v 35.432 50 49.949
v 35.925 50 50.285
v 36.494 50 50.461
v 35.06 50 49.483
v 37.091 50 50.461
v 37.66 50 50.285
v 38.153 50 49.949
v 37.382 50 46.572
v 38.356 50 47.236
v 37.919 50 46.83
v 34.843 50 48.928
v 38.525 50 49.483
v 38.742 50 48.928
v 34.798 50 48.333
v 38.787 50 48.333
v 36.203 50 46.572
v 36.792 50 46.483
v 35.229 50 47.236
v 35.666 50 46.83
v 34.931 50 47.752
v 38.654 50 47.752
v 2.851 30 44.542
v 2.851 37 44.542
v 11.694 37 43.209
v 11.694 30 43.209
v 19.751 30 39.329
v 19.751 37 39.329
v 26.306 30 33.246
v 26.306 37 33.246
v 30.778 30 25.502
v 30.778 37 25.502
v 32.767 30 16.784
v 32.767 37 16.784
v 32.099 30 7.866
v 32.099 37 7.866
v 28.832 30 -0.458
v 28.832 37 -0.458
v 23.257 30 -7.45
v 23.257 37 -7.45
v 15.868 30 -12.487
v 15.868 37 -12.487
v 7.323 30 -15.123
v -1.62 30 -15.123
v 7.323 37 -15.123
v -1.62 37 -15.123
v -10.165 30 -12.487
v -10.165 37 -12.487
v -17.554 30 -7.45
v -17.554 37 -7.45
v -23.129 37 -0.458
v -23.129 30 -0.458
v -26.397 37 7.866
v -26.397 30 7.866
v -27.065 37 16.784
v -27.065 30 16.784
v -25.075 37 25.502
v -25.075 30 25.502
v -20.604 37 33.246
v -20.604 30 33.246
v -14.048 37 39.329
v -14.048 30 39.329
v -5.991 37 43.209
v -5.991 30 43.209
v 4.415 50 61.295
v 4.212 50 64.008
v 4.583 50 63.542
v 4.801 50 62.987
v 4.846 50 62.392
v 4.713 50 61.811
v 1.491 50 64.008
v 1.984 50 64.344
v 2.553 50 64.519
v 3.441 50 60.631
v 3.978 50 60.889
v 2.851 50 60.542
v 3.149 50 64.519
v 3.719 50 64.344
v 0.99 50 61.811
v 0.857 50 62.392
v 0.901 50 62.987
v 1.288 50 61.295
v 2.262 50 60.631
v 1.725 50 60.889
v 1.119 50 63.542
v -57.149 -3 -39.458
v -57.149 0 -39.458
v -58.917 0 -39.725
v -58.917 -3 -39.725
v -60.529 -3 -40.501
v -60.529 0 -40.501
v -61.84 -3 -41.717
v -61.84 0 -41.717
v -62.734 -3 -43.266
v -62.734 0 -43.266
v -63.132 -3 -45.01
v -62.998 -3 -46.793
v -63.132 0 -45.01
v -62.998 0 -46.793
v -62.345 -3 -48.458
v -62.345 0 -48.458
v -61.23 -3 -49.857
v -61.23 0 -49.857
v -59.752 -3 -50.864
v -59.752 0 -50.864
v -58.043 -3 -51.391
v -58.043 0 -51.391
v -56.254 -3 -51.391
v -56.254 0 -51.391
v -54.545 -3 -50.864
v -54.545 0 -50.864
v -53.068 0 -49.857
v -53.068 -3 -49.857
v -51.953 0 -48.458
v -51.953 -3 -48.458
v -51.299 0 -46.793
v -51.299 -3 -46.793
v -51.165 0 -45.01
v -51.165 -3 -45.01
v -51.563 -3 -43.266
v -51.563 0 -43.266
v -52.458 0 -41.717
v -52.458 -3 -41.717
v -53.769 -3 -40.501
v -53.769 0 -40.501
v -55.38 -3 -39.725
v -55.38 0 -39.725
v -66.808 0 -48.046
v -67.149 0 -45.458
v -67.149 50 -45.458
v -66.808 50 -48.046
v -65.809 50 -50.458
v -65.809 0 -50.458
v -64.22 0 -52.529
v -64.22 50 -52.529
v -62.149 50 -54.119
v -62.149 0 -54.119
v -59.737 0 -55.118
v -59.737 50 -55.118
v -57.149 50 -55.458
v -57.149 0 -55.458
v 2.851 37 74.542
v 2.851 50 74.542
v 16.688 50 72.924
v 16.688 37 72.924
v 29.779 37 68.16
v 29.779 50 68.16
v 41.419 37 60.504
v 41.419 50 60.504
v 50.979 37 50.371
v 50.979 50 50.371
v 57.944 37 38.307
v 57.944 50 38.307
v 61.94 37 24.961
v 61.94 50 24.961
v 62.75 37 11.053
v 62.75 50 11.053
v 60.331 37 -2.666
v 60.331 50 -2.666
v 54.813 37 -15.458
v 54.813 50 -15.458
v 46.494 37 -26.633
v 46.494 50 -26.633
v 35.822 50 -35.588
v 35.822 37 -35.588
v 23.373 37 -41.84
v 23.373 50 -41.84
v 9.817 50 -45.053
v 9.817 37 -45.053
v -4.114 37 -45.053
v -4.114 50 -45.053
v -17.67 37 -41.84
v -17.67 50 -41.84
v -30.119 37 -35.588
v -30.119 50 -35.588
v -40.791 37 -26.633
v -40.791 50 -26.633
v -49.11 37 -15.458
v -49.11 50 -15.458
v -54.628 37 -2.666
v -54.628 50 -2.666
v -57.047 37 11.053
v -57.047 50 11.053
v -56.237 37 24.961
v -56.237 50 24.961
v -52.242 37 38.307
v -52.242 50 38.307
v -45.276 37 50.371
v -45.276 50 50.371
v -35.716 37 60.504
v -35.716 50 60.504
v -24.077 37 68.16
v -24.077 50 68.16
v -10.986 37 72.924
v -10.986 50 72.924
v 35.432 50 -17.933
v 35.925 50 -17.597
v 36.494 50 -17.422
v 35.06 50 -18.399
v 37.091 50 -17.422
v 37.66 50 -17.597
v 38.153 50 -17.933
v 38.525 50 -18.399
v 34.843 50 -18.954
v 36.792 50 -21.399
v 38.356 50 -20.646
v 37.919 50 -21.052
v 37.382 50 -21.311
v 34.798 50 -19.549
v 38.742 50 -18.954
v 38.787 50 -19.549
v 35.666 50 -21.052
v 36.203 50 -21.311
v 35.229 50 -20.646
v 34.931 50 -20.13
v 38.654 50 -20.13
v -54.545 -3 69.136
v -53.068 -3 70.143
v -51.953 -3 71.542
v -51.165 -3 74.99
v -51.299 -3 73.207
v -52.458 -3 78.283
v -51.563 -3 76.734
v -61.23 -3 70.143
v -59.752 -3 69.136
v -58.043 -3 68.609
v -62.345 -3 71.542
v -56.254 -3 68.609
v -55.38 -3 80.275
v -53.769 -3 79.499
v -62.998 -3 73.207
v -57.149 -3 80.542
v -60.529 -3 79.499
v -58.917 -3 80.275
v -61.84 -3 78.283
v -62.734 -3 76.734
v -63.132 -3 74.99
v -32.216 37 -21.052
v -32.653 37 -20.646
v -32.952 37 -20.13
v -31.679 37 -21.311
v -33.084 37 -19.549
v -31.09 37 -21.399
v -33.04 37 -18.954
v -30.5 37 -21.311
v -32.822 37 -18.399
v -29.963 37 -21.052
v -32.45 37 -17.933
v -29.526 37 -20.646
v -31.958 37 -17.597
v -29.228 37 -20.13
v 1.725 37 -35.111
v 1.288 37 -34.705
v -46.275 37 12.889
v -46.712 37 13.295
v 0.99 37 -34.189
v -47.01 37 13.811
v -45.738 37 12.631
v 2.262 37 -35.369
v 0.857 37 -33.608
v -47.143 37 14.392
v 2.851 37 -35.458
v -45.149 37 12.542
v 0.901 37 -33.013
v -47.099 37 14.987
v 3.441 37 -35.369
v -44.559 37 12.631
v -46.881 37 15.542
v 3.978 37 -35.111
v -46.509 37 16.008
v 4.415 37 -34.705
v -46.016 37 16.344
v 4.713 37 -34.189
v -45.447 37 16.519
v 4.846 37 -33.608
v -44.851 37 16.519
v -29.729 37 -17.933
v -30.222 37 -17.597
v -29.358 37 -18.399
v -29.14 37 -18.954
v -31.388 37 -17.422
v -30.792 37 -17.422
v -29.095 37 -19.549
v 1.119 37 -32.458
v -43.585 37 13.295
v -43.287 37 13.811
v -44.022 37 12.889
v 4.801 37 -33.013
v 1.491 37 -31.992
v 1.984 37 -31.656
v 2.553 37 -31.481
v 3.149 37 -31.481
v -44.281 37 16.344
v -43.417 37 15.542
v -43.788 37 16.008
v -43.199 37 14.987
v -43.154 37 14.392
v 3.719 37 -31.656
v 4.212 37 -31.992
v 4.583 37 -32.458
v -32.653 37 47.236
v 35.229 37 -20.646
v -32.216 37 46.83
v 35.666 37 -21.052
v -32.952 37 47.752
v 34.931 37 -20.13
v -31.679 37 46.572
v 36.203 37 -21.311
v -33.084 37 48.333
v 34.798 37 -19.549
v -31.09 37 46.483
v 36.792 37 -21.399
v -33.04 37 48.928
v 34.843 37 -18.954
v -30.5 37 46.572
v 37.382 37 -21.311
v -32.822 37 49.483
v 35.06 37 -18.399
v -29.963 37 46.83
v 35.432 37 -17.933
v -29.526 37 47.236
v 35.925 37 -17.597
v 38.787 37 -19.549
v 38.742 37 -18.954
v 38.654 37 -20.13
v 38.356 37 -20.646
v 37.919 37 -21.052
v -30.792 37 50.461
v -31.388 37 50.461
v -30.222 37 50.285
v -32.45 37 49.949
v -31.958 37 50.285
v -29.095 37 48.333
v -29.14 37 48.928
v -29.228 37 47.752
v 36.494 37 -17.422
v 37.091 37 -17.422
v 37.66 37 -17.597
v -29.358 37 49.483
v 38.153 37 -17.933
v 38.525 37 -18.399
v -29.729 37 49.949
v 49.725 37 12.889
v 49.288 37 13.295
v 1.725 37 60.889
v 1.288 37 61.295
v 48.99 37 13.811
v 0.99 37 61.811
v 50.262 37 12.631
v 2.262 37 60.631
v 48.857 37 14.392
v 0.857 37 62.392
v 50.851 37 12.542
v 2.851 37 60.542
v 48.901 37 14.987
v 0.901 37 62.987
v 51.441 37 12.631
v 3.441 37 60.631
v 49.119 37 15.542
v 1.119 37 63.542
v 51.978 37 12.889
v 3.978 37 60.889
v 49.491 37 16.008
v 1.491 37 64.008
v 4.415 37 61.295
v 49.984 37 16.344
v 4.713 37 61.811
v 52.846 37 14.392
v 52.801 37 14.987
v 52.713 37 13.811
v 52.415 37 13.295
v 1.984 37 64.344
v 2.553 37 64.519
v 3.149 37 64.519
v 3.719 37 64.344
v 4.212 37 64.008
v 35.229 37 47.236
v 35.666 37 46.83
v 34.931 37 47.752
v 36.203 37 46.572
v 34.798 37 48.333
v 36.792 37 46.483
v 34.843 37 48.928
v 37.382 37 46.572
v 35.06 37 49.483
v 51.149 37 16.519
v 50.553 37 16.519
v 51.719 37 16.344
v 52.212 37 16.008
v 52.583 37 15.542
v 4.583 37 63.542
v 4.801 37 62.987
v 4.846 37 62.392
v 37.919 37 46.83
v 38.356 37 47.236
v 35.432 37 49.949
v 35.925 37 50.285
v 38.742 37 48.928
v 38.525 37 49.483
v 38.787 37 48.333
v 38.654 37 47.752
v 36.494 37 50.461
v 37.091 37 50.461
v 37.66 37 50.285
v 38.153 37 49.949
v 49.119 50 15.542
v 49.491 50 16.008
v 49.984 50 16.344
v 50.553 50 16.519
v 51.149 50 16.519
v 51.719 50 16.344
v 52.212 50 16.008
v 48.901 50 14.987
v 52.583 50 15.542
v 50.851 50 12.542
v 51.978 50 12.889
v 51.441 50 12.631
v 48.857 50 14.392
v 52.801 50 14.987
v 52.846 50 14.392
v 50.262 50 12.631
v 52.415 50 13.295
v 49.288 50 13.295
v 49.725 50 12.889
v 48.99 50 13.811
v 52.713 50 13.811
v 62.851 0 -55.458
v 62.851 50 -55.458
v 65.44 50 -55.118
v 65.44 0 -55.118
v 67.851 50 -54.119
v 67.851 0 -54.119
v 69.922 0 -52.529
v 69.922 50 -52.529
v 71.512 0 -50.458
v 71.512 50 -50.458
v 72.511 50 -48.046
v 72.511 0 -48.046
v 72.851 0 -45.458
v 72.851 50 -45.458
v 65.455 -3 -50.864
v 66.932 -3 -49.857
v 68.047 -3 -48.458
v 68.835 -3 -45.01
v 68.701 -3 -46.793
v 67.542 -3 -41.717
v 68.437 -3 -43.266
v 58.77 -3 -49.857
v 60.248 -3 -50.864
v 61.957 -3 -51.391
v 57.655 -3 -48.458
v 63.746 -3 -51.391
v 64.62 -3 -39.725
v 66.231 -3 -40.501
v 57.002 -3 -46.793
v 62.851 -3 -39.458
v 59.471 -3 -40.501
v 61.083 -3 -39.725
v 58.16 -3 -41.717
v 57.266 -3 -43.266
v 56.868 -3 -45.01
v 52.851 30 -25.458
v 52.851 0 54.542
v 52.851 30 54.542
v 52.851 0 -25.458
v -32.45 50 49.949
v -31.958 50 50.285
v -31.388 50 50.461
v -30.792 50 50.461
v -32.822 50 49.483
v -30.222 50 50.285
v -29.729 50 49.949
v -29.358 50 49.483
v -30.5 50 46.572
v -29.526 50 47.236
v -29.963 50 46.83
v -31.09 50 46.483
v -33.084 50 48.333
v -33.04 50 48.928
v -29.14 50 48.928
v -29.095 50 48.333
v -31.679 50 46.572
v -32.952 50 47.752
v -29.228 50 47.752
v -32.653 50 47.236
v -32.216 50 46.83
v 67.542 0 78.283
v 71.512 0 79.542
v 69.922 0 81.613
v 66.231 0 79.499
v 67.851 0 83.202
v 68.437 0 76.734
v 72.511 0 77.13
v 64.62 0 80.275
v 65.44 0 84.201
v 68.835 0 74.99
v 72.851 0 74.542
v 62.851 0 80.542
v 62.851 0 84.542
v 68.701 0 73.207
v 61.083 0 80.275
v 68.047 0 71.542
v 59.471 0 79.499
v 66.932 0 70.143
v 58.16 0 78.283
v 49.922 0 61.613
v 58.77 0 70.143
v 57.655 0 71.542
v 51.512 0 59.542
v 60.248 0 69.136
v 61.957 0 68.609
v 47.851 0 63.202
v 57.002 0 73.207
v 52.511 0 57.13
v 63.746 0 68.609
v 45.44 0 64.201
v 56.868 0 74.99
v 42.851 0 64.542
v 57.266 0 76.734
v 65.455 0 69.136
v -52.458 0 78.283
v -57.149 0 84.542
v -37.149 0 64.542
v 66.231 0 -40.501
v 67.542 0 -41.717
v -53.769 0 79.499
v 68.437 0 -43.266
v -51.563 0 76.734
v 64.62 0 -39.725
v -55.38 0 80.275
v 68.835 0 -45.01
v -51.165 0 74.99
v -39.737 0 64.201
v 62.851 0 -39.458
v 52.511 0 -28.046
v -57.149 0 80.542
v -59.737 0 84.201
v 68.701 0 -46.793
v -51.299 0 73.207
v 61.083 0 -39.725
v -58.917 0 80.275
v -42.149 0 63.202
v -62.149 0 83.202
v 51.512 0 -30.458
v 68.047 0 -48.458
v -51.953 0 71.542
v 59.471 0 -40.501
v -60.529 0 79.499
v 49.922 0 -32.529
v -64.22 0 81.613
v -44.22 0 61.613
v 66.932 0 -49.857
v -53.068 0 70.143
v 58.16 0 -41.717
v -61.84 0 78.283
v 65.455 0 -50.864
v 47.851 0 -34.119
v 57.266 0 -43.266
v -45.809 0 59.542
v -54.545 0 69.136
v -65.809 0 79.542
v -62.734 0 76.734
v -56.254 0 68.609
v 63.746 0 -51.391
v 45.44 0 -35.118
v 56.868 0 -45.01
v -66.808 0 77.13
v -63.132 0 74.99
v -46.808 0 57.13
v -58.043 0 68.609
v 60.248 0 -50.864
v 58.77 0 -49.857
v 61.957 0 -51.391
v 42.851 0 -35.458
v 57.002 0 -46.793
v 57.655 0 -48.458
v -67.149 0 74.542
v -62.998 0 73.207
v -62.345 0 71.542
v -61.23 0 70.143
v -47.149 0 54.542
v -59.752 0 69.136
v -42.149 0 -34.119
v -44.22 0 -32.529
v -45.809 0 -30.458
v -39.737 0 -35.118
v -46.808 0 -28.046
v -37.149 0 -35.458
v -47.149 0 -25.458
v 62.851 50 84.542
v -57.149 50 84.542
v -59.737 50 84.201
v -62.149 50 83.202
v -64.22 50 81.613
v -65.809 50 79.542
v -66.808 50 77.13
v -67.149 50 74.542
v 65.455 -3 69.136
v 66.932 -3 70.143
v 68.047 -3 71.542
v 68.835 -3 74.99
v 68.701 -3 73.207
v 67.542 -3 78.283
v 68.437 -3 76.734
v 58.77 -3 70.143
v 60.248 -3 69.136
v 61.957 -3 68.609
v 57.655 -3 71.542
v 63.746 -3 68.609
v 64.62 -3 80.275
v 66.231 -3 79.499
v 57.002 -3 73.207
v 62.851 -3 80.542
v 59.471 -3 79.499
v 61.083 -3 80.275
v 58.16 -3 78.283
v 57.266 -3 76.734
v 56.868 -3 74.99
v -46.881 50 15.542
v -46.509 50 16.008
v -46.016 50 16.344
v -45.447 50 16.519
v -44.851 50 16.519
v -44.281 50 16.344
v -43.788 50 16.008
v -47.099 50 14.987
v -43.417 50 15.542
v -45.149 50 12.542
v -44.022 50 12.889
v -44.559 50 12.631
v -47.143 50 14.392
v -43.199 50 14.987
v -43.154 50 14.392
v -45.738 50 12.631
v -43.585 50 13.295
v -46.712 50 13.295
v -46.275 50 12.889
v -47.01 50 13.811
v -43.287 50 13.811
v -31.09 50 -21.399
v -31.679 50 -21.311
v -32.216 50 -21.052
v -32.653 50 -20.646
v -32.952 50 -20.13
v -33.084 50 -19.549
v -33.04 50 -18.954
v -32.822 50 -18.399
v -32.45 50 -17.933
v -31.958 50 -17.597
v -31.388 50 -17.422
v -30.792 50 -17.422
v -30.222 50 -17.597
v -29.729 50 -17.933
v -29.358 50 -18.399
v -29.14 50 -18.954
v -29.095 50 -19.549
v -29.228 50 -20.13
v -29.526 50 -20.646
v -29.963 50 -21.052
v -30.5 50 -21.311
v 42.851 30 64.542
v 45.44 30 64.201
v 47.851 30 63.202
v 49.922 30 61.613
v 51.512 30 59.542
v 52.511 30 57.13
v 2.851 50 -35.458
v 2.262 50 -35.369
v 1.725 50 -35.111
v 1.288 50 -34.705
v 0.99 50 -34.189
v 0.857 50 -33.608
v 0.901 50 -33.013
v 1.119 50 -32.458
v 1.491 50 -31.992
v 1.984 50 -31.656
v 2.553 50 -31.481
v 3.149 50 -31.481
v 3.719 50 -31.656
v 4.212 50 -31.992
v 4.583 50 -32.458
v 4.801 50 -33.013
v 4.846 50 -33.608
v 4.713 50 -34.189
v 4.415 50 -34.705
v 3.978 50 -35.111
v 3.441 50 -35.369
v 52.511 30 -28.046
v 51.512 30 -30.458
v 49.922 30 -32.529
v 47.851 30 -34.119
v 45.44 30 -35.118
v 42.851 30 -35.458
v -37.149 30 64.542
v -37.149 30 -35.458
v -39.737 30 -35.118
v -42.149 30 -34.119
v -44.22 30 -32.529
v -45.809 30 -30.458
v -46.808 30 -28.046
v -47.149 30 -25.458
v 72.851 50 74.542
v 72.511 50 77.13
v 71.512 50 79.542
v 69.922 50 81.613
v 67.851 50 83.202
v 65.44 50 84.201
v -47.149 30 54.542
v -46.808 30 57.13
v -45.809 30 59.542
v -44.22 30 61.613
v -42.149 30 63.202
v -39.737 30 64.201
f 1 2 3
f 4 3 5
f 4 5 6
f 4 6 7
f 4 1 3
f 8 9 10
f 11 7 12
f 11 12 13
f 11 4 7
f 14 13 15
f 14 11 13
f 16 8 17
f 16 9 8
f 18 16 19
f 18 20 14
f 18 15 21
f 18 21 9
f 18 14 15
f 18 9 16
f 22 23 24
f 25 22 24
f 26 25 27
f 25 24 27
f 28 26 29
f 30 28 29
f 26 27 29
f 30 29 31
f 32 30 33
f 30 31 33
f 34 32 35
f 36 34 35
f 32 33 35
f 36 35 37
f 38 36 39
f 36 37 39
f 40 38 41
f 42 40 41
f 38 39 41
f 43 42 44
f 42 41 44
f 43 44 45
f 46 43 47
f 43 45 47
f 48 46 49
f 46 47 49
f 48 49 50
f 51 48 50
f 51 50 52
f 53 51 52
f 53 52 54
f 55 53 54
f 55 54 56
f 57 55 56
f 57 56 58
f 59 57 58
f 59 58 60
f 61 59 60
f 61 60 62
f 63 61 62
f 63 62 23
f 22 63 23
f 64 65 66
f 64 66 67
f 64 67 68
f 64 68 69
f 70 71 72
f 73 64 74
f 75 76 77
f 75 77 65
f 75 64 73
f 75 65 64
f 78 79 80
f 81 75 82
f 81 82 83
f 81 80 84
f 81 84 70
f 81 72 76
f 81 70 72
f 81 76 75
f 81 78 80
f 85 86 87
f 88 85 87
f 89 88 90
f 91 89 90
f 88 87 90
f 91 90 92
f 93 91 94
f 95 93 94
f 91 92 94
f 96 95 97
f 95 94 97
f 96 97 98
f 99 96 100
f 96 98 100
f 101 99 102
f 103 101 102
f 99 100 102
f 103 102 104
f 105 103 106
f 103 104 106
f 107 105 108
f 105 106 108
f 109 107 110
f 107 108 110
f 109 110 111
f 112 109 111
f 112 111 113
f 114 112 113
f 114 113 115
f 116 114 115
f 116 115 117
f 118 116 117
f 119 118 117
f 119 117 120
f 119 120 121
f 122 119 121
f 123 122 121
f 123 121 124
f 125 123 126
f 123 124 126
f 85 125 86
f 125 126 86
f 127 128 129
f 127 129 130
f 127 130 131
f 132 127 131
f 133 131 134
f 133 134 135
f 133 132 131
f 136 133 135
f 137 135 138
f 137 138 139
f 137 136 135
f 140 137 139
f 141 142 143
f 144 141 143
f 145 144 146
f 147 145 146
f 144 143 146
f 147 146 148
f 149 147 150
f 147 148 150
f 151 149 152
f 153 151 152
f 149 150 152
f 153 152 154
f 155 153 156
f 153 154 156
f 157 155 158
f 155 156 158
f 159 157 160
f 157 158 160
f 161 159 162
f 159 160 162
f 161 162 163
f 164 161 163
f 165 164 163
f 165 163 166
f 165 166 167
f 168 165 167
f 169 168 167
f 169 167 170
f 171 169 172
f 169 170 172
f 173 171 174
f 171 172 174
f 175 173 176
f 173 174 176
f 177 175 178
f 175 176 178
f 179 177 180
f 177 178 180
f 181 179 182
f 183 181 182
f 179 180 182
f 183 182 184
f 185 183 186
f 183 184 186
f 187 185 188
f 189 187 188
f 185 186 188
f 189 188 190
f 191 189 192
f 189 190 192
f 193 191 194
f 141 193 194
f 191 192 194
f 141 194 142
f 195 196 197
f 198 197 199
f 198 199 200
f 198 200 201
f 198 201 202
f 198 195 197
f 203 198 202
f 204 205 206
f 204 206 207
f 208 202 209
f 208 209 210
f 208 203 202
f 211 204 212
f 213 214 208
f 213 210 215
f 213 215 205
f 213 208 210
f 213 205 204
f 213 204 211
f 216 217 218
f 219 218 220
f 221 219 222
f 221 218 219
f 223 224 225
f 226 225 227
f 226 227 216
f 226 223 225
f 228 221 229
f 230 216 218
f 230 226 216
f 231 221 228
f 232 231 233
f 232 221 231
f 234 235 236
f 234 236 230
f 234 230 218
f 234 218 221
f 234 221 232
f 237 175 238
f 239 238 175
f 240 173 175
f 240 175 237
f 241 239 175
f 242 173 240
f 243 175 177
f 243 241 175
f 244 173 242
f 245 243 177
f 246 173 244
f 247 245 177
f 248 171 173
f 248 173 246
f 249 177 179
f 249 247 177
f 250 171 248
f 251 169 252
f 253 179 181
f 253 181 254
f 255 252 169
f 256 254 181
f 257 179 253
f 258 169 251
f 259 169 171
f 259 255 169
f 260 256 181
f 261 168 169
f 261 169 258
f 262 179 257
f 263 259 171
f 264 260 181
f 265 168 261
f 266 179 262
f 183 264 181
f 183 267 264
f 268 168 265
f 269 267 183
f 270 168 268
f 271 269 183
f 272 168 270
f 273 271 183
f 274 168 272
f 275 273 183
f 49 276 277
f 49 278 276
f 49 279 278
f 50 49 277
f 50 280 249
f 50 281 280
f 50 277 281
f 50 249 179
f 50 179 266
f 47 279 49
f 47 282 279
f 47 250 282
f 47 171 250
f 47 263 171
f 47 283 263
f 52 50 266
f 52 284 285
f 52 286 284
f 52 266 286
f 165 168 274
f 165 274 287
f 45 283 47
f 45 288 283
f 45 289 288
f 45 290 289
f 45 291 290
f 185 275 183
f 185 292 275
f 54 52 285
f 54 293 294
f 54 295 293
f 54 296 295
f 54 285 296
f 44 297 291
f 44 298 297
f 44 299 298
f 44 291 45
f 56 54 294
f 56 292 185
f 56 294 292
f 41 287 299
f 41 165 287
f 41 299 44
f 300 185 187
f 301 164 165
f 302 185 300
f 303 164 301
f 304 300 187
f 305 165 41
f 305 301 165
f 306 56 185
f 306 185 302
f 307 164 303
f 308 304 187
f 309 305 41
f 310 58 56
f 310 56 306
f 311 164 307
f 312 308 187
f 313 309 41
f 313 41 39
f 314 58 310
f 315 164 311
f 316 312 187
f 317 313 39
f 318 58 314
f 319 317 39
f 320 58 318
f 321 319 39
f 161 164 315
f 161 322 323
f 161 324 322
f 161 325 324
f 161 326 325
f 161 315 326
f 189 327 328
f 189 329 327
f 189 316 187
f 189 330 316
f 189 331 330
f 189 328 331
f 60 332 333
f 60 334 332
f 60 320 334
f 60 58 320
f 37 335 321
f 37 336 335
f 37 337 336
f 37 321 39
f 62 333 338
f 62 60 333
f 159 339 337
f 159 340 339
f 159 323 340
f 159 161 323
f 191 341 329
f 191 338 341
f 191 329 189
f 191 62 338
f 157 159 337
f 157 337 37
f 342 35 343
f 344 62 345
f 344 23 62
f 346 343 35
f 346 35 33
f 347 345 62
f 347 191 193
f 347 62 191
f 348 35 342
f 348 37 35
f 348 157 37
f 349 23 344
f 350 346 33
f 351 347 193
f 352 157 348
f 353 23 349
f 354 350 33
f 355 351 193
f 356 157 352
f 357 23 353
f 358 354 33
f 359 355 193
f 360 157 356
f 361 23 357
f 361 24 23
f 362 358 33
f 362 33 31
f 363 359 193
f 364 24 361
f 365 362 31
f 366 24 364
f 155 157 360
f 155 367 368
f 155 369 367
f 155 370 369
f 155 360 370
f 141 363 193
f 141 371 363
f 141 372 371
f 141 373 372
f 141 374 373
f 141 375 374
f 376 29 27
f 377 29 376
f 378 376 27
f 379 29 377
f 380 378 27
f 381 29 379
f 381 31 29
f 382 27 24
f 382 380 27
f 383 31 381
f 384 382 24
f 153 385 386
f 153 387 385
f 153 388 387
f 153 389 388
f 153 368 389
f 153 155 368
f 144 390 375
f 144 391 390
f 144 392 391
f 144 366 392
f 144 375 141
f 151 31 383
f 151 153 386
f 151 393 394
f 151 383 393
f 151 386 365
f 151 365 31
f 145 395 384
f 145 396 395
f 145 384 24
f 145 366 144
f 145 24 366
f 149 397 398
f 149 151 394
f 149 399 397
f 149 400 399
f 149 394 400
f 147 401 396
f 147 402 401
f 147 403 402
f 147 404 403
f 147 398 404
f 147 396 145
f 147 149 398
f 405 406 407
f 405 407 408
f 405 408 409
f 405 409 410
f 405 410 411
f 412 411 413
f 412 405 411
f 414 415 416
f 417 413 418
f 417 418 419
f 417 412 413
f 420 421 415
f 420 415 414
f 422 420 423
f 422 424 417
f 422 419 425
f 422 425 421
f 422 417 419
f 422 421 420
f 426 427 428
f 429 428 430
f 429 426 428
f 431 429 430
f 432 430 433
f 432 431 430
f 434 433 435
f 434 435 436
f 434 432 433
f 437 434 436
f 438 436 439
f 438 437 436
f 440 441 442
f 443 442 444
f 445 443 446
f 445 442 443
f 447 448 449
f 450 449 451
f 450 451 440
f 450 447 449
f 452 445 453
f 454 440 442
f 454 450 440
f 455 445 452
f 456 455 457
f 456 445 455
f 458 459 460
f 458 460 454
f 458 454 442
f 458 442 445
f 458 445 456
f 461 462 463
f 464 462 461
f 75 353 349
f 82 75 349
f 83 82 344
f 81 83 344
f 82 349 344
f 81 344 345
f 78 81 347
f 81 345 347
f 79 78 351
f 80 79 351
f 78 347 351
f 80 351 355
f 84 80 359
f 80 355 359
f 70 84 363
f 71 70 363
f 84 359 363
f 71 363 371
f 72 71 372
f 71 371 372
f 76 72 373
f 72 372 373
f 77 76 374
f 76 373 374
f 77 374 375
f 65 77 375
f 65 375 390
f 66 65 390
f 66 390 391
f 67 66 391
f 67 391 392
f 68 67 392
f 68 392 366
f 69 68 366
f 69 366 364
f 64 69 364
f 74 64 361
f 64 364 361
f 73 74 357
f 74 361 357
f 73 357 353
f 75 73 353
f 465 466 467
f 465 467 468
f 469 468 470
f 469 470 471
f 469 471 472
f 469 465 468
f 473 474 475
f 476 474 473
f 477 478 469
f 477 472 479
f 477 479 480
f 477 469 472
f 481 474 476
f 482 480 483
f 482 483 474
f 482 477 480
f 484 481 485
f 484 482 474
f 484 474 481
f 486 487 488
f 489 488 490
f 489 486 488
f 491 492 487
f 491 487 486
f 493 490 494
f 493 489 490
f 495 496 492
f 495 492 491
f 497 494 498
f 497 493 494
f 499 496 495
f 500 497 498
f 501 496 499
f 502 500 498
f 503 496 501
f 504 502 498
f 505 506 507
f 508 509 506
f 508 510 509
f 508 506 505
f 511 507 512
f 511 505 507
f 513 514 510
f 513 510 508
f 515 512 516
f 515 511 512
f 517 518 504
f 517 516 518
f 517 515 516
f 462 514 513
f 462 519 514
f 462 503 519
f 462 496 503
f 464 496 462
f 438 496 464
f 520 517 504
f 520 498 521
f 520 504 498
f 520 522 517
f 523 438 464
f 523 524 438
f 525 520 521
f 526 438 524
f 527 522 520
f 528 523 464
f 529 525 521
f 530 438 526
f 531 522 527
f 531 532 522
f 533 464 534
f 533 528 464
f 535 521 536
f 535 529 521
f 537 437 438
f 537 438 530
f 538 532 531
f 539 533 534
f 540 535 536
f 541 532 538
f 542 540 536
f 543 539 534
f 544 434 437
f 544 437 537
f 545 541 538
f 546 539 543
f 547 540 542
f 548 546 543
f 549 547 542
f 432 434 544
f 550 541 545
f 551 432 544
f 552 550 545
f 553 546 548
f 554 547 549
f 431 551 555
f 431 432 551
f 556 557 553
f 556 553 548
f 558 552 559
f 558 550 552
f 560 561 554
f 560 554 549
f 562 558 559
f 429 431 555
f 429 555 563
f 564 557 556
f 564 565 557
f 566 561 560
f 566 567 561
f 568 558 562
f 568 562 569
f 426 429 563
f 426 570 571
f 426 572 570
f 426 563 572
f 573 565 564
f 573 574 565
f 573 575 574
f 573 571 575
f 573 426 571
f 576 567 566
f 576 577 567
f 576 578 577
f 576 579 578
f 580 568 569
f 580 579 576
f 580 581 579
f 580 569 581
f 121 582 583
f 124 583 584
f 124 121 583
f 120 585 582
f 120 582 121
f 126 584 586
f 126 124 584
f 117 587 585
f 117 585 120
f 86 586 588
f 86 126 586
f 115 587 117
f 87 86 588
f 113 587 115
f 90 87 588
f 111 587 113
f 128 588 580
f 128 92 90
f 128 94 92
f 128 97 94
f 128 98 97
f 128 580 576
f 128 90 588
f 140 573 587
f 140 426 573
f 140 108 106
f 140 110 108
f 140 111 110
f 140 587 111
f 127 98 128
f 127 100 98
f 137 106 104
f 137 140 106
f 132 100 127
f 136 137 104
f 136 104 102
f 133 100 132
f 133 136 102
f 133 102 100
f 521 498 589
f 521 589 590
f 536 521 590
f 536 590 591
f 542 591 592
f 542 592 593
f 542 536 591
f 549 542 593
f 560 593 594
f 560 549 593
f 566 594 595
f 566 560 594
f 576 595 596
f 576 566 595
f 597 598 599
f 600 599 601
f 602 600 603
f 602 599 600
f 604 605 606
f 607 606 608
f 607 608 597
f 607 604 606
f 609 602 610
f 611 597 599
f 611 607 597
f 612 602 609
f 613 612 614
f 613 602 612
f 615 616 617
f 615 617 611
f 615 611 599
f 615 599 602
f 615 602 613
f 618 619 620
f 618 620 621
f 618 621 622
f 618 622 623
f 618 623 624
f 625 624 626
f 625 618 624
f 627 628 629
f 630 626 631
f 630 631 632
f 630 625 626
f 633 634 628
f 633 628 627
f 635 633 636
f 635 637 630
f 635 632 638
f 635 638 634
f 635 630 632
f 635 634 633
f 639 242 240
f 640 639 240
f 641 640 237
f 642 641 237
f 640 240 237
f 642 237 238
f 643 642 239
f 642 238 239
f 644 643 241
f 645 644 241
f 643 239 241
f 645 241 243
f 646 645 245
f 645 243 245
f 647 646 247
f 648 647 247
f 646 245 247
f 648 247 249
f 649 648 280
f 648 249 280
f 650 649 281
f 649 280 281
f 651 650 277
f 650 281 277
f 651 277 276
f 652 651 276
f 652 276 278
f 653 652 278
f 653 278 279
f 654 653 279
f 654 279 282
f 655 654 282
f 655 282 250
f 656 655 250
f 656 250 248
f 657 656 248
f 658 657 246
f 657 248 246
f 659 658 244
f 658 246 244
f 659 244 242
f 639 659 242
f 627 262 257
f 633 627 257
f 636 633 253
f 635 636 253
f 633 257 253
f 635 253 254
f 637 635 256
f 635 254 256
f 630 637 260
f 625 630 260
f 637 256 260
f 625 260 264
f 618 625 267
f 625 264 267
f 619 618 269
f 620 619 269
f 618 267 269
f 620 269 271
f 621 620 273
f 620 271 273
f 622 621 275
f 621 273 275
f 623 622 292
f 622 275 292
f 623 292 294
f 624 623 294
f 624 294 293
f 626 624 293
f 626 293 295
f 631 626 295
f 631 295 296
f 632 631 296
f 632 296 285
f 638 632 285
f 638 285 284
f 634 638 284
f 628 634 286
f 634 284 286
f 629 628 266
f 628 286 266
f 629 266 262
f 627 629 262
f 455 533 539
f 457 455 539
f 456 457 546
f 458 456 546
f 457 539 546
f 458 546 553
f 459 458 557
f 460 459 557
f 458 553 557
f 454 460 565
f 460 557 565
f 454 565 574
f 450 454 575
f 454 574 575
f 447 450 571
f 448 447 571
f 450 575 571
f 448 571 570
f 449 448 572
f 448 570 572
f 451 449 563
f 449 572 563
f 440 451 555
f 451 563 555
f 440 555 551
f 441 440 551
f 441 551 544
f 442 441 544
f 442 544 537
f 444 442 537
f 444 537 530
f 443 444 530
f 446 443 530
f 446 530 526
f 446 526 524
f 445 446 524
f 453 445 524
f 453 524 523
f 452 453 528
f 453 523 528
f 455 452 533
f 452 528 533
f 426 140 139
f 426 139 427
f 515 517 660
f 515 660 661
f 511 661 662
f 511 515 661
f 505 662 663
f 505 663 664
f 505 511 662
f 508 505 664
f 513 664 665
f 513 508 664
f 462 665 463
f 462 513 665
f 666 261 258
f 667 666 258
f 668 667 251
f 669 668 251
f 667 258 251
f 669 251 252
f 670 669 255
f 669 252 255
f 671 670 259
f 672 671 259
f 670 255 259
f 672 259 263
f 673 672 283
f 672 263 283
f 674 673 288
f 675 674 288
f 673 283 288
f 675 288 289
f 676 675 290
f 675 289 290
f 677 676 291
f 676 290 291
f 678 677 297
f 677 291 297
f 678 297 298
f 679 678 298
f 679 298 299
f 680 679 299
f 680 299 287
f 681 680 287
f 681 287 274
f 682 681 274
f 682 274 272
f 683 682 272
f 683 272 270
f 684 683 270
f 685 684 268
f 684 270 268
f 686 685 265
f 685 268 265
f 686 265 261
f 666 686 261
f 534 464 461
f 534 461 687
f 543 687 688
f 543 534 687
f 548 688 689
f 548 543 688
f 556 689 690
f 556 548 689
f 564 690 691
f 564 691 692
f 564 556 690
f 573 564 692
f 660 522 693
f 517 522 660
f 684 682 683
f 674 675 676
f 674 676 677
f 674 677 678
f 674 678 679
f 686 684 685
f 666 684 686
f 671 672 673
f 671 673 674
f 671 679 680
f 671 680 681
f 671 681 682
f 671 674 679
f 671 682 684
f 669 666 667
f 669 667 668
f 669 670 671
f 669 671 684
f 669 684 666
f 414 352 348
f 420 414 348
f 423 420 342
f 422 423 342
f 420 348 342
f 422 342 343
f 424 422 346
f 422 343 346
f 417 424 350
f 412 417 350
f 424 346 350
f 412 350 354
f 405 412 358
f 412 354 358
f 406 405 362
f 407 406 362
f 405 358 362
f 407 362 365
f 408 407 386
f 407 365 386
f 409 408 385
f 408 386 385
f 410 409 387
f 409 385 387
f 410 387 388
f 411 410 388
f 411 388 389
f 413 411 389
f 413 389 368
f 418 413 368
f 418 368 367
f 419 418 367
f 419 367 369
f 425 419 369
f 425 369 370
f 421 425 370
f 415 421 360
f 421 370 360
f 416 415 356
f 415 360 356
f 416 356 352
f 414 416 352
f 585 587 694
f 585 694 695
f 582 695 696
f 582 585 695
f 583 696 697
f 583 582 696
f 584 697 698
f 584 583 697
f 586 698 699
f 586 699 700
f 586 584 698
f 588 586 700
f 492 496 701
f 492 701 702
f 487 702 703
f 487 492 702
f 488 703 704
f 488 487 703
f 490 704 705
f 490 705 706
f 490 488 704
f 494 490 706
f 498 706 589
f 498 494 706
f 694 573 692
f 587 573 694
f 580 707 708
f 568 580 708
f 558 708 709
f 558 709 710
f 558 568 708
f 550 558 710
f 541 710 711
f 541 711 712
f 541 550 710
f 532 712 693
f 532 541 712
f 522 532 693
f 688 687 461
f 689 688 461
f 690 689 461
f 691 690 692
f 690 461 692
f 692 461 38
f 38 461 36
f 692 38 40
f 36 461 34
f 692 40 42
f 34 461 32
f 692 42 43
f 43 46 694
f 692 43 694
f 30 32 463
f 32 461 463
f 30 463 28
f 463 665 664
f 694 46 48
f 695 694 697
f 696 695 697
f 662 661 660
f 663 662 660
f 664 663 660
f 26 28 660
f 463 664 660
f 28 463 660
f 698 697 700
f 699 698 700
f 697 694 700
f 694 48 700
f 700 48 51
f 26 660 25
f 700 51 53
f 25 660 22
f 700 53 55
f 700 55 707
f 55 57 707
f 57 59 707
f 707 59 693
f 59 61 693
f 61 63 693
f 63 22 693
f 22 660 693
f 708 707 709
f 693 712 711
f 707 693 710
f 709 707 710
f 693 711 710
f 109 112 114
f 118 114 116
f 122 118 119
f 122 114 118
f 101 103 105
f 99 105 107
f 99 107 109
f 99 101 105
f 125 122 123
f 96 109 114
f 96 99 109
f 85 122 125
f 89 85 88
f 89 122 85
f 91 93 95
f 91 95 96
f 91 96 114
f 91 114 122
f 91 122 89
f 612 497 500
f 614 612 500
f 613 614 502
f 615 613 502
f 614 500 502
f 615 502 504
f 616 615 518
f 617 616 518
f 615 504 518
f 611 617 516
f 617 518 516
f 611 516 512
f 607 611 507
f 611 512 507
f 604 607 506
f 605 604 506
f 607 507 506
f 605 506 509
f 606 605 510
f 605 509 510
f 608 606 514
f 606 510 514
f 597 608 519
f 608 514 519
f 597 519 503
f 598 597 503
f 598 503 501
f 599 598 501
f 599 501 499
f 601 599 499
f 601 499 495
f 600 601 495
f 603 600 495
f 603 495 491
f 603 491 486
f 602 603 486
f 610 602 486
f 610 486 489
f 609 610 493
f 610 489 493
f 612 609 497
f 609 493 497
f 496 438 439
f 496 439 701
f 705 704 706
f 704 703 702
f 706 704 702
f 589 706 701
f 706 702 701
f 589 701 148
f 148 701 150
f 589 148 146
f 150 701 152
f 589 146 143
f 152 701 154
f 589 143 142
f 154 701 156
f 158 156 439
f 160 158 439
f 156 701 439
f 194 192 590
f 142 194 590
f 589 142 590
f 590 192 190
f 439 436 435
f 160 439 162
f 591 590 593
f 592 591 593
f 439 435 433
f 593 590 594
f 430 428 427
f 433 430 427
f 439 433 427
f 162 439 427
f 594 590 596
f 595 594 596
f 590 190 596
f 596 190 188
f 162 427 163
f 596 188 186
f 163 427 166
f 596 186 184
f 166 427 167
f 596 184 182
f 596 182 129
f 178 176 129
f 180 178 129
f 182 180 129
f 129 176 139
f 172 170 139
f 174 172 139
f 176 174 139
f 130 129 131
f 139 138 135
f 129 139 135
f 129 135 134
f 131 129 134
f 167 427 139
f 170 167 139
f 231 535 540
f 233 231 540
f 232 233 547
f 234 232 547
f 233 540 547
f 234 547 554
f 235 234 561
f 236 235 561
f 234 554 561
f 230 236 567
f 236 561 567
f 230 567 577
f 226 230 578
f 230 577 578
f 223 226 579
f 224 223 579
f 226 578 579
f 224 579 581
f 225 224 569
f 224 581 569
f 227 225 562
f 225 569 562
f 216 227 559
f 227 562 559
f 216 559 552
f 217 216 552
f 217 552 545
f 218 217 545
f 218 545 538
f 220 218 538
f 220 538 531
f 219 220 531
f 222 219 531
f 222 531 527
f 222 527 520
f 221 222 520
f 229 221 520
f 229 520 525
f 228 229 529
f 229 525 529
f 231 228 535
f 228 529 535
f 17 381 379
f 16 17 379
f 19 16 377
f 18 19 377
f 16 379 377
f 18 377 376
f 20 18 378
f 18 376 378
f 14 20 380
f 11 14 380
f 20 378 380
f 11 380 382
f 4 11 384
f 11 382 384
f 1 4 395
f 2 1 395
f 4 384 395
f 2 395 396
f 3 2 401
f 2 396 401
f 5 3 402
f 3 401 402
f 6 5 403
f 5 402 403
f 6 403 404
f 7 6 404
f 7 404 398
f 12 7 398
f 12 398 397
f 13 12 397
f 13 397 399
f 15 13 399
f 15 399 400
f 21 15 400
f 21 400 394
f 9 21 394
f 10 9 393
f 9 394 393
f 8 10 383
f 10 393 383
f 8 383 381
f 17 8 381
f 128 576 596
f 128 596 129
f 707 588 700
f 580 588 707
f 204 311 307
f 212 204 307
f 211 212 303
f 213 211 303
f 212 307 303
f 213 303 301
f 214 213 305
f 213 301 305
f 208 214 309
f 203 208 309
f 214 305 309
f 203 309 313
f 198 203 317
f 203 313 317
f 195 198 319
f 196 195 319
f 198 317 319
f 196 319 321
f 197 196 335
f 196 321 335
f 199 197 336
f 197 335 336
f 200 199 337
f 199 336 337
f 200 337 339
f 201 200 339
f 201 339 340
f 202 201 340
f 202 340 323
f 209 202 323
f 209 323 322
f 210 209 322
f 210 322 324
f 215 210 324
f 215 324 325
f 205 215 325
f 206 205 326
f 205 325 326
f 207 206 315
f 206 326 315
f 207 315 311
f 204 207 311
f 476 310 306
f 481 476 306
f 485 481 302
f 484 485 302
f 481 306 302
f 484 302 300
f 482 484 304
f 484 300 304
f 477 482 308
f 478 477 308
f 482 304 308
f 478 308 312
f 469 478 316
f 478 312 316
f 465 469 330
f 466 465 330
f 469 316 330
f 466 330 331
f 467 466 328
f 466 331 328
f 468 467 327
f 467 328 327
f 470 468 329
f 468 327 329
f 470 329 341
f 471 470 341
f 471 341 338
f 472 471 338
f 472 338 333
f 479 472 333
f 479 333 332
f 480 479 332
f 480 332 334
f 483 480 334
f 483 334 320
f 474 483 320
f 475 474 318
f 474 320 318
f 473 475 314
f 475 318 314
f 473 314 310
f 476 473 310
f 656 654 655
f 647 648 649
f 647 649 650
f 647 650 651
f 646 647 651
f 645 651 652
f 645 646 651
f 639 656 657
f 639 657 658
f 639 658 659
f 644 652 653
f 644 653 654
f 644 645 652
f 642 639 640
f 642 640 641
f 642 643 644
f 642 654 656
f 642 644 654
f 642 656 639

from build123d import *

# Parameters (mm, degrees)
BOSS_EXTRUDE1_DEPTH = 50
SKETCH2_R           = 60
CUT_EXTRUDE1_DEPTH  = 13
SKETCH3_R           = 10
CUT_EXTRUDE2_DEPTH  = 50
SKETCH4_R           = 2
BOSS_EXTRUDE2_DEPTH = 13
CUT_EXTRUDE3_DEPTH  = 30
SKETCH6_R           = 6
BOSS_EXTRUDE4_DEPTH = 3
SKETCH7_R           = 30
CUT_EXTRUDE4_DEPTH  = 40


with BuildPart() as part:
    # Sketch1 → Boss-Extrude1 (new body)
    with BuildSketch(Plane(origin=(0, 0, 0), x_dir=(1, 0, 0), z_dir=(0, 1, 0))):
        with BuildLine():
            Line((-57.148676171, 55.458248473), (62.851323829, 55.458248473))
            ThreePointArc((62.851323829, 55.458248473), (69.922391641, 52.529316284), (72.851323829, 45.458248473))
            Line((72.851323829, 45.458248473), (72.851323829, -74.541751527))
            ThreePointArc((72.851323829, -74.541751527), (69.922391641, -81.612819339), (62.851323829, -84.541751527))
            Line((62.851323829, -84.541751527), (-57.148676171, -84.541751527))
            ThreePointArc((-57.148676171, -84.541751527), (-64.219743983, -81.612819339), (-67.148676171, -74.541751527))
            Line((-67.148676171, -74.541751527), (-67.148676171, 45.458248473))
            ThreePointArc((-67.148676171, 45.458248473), (-64.219743983, 52.529316284), (-57.148676171, 55.458248473))
        make_face()
    extrude(amount=BOSS_EXTRUDE1_DEPTH)

    # Sketch2 → Cut-Extrude1 (cut)
    with BuildSketch(Plane(origin=(0, 50, 0), x_dir=(1, 0, 0), z_dir=(0, 1, 0))):
        with Locations(Location((2.851323829, -14.541751527, 0), (0, 0, 270))):
            Circle(SKETCH2_R)
    extrude(amount=-CUT_EXTRUDE1_DEPTH, mode=Mode.SUBTRACT)

    # Sketch3 → Cut-Extrude2 (cut)
    with BuildSketch(Plane(origin=(0, 37, 0), x_dir=(1, 0, 0), z_dir=(0, 1, 0))):
        with Locations(Location((2.851323829, -14.541751527, 0), (0, 0, 270))):
            Circle(SKETCH3_R)
    extrude(amount=-CUT_EXTRUDE2_DEPTH, mode=Mode.SUBTRACT)

    # Sketch4 → Boss-Extrude2 (add)
    with BuildSketch(Plane(origin=(0, 37, 0), x_dir=(1, 0, 0), z_dir=(0, 1, 0))):
        with Locations(Location((2.851323829, 33.458248473, 0), (0, 0, 90))):
            Circle(SKETCH4_R)
        with Locations(Location((36.792449326, 19.399373969, 0), (0, 0, 90))):
            Circle(SKETCH4_R)
        with Locations(Location((50.851323829, -14.541751527, 0), (0, 0, 90))):
            Circle(SKETCH4_R)
        with Locations(Location((36.792449326, -48.482877024, 0), (0, 0, 90))):
            Circle(SKETCH4_R)
        with Locations(Location((2.851323829, -62.541751527, 0), (0, 0, 90))):
            Circle(SKETCH4_R)
        with Locations(Location((-31.089801668, -48.482877024, 0), (0, 0, 90))):
            Circle(SKETCH4_R)
        with Locations(Location((-45.148676171, -14.541751527, 0), (0, 0, 90))):
            Circle(SKETCH4_R)
        with Locations(Location((-31.089801668, 19.399373969, 0), (0, 0, 90))):
            Circle(SKETCH4_R)
    extrude(amount=BOSS_EXTRUDE2_DEPTH)

    # Sketch5 → Cut-Extrude3 (cut)
    with BuildSketch(Plane.XZ):
        with BuildLine():
            Line((-37.148676171, 64.541751527), (42.851323829, 64.541751527))
            ThreePointArc((42.851323829, 64.541751527), (49.922391641, 61.612819339), (52.851323829, 54.541751527))
            Line((52.851323829, 54.541751527), (52.851323829, -25.458248473))
            ThreePointArc((52.851323829, -25.458248473), (49.922391641, -32.529316284), (42.851323829, -35.458248473))
            Line((42.851323829, -35.458248473), (-37.148676171, -35.458248473))
            ThreePointArc((-37.148676171, -35.458248473), (-44.219743983, -32.529316284), (-47.148676171, -25.458248473))
            Line((-47.148676171, -25.458248473), (-47.148676171, 54.541751527))
            ThreePointArc((-47.148676171, 54.541751527), (-44.219743983, 61.612819339), (-37.148676171, 64.541751527))
        make_face()
    extrude(amount=-CUT_EXTRUDE3_DEPTH, mode=Mode.SUBTRACT)

    # Sketch6 → Boss-Extrude4 (add)
    with BuildSketch(Plane.XZ):
        with Locations(Location((-57.148676171, 74.541751527, 0), (0, 0, 90))):
            Circle(SKETCH6_R)
        with Locations(Location((62.851323829, 74.541751527, 0), (0, 0, 90))):
            Circle(SKETCH6_R)
        with Locations(Location((62.851323829, -45.458248473, 0), (0, 0, 90))):
            Circle(SKETCH6_R)
        with Locations(Location((-57.148676171, -45.458248473, 0), (0, 0, 90))):
            Circle(SKETCH6_R)
    extrude(amount=BOSS_EXTRUDE4_DEPTH)

    # Sketch7 → Cut-Extrude4 (cut)
    with BuildSketch(Plane(origin=(0, 37, 0), x_dir=(1, 0, 0), z_dir=(0, 1, 0))):
        with Locations(Location((2.851323829, -14.541751527, 0), (0, 0, 270))):
            Circle(SKETCH7_R)
    extrude(amount=-CUT_EXTRUDE4_DEPTH, mode=Mode.SUBTRACT)


solid = part.part
